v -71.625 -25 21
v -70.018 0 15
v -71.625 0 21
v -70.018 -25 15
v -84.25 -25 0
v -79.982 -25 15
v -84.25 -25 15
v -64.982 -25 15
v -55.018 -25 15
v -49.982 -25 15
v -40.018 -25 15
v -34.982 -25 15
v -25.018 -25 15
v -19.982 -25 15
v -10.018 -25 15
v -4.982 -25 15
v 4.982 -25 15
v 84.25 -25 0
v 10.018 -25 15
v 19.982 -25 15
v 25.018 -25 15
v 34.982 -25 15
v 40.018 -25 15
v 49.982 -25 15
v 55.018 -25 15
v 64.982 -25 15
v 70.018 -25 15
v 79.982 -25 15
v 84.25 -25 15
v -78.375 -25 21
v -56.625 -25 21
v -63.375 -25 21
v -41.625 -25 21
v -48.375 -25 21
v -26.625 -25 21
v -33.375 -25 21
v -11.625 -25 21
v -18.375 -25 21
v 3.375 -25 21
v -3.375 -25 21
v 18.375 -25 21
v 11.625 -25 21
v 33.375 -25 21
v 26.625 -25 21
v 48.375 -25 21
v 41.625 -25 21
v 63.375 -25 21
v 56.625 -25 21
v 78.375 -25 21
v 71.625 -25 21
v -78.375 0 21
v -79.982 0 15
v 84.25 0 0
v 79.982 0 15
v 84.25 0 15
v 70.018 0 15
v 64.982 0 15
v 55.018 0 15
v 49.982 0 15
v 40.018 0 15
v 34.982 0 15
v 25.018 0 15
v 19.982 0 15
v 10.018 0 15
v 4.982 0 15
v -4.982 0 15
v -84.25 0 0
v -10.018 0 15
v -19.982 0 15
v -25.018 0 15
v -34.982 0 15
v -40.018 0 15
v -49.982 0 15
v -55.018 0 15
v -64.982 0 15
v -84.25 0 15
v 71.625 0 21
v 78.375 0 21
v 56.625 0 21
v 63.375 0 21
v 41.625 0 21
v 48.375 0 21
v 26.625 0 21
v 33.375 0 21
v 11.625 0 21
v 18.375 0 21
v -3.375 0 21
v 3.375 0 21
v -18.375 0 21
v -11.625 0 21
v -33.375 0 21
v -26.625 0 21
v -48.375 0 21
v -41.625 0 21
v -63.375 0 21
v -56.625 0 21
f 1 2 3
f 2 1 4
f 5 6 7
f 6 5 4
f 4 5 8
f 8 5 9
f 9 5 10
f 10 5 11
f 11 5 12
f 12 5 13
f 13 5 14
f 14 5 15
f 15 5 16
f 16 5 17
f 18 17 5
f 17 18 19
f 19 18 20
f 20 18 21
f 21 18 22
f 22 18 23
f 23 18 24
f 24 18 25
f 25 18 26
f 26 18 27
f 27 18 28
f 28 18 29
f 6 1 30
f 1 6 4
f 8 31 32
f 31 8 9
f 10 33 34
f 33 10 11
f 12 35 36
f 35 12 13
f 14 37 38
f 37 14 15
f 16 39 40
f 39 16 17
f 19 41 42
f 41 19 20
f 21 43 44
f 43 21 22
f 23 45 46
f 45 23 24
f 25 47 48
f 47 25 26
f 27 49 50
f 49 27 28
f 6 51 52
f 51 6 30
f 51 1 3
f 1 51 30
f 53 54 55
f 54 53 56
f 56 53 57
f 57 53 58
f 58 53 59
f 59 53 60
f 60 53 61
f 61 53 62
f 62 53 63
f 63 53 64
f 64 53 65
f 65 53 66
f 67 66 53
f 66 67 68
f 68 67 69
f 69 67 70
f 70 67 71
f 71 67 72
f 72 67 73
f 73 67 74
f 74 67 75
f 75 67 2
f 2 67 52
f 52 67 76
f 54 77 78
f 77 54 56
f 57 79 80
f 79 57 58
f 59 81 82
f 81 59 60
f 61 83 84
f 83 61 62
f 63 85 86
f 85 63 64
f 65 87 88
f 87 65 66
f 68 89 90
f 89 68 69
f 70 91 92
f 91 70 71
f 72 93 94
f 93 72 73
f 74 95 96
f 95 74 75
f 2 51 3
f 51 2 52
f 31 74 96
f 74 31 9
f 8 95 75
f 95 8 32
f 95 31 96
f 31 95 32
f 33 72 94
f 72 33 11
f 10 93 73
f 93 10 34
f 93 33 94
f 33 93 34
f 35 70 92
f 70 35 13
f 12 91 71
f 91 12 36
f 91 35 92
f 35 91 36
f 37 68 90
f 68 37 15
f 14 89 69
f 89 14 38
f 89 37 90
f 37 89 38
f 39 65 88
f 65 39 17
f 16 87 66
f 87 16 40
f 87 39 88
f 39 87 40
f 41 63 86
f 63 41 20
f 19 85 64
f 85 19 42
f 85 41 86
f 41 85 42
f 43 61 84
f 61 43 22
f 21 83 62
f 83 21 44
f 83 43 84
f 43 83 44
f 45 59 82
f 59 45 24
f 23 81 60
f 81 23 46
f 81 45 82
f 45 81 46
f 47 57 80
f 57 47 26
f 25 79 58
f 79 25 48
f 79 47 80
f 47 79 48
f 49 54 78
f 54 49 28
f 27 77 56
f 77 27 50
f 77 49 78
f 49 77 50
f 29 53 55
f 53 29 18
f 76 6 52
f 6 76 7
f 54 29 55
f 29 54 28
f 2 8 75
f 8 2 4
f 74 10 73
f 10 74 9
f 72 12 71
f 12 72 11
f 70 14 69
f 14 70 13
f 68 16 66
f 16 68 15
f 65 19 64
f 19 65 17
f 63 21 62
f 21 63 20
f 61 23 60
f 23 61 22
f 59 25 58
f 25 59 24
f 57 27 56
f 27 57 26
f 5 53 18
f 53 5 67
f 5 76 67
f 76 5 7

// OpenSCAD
$fn = 32;

// ----------------------------------------------------------------------
// Toothed rack, 11 teeth
// 15 mm pitch, 6 mm teeth
// ----------------------------------------------------------------------

// --- parameters (mm) ---
bar_w = 25;      // bar width (Y)
bar_h = 15;      // bar height (Z)
teeth = 11;      // number of teeth
pitch = 15;      // tooth pitch
tooth_h = 6;     // tooth height above the bar
root_w = 10.5;   // tooth width at the root
crest_w = 6.75;  // tooth width at the crest

// --- derived feature positions (mm) ---
span = (teeth - 1) * pitch;  // = 150   distance between the outer teeth
bar_l = span + root_w + 8;   // = 168.5   bar length: teeth plus 4 mm at each end
tooth_x = -span / 2;         // = -75   X of the first tooth
height = bar_h + tooth_h;    // = 21   overall height
feature_centers = [
  [tooth_x + 0 * pitch, -bar_w / 2],
  [tooth_x + 1 * pitch, -bar_w / 2],
  [tooth_x + 2 * pitch, -bar_w / 2],
  [tooth_x + 3 * pitch, -bar_w / 2],
  [tooth_x + 4 * pitch, -bar_w / 2],
  [tooth_x + 5 * pitch, -bar_w / 2],
  [tooth_x + 6 * pitch, -bar_w / 2],
  [tooth_x + 7 * pitch, -bar_w / 2],
  [tooth_x + 8 * pitch, -bar_w / 2],
  [tooth_x + 9 * pitch, -bar_w / 2],
  [tooth_x + 10 * pitch, -bar_w / 2]
];   // tooth centre line, drives the tooth loop

// bar with a rack of teeth, one extruded trapezoium per centre
module rack_tooth() {
  linear_extrude(height = bar_w)
    polygon(points = [
      [0, 0],
      [root_w, 0],
      [root_w / 2 + crest_w / 2, tooth_h + 1],
      [root_w / 2 - crest_w / 2, tooth_h + 1]
    ]);
}

union() {
  translate([-bar_l / 2, -bar_w, 0]) cube([bar_l, bar_w, bar_h]);
  for (centre = feature_centers)
    translate([centre[0] - root_w / 2, 0, bar_h - 1]) rotate([90, 0, 0]) rack_tooth();
}
